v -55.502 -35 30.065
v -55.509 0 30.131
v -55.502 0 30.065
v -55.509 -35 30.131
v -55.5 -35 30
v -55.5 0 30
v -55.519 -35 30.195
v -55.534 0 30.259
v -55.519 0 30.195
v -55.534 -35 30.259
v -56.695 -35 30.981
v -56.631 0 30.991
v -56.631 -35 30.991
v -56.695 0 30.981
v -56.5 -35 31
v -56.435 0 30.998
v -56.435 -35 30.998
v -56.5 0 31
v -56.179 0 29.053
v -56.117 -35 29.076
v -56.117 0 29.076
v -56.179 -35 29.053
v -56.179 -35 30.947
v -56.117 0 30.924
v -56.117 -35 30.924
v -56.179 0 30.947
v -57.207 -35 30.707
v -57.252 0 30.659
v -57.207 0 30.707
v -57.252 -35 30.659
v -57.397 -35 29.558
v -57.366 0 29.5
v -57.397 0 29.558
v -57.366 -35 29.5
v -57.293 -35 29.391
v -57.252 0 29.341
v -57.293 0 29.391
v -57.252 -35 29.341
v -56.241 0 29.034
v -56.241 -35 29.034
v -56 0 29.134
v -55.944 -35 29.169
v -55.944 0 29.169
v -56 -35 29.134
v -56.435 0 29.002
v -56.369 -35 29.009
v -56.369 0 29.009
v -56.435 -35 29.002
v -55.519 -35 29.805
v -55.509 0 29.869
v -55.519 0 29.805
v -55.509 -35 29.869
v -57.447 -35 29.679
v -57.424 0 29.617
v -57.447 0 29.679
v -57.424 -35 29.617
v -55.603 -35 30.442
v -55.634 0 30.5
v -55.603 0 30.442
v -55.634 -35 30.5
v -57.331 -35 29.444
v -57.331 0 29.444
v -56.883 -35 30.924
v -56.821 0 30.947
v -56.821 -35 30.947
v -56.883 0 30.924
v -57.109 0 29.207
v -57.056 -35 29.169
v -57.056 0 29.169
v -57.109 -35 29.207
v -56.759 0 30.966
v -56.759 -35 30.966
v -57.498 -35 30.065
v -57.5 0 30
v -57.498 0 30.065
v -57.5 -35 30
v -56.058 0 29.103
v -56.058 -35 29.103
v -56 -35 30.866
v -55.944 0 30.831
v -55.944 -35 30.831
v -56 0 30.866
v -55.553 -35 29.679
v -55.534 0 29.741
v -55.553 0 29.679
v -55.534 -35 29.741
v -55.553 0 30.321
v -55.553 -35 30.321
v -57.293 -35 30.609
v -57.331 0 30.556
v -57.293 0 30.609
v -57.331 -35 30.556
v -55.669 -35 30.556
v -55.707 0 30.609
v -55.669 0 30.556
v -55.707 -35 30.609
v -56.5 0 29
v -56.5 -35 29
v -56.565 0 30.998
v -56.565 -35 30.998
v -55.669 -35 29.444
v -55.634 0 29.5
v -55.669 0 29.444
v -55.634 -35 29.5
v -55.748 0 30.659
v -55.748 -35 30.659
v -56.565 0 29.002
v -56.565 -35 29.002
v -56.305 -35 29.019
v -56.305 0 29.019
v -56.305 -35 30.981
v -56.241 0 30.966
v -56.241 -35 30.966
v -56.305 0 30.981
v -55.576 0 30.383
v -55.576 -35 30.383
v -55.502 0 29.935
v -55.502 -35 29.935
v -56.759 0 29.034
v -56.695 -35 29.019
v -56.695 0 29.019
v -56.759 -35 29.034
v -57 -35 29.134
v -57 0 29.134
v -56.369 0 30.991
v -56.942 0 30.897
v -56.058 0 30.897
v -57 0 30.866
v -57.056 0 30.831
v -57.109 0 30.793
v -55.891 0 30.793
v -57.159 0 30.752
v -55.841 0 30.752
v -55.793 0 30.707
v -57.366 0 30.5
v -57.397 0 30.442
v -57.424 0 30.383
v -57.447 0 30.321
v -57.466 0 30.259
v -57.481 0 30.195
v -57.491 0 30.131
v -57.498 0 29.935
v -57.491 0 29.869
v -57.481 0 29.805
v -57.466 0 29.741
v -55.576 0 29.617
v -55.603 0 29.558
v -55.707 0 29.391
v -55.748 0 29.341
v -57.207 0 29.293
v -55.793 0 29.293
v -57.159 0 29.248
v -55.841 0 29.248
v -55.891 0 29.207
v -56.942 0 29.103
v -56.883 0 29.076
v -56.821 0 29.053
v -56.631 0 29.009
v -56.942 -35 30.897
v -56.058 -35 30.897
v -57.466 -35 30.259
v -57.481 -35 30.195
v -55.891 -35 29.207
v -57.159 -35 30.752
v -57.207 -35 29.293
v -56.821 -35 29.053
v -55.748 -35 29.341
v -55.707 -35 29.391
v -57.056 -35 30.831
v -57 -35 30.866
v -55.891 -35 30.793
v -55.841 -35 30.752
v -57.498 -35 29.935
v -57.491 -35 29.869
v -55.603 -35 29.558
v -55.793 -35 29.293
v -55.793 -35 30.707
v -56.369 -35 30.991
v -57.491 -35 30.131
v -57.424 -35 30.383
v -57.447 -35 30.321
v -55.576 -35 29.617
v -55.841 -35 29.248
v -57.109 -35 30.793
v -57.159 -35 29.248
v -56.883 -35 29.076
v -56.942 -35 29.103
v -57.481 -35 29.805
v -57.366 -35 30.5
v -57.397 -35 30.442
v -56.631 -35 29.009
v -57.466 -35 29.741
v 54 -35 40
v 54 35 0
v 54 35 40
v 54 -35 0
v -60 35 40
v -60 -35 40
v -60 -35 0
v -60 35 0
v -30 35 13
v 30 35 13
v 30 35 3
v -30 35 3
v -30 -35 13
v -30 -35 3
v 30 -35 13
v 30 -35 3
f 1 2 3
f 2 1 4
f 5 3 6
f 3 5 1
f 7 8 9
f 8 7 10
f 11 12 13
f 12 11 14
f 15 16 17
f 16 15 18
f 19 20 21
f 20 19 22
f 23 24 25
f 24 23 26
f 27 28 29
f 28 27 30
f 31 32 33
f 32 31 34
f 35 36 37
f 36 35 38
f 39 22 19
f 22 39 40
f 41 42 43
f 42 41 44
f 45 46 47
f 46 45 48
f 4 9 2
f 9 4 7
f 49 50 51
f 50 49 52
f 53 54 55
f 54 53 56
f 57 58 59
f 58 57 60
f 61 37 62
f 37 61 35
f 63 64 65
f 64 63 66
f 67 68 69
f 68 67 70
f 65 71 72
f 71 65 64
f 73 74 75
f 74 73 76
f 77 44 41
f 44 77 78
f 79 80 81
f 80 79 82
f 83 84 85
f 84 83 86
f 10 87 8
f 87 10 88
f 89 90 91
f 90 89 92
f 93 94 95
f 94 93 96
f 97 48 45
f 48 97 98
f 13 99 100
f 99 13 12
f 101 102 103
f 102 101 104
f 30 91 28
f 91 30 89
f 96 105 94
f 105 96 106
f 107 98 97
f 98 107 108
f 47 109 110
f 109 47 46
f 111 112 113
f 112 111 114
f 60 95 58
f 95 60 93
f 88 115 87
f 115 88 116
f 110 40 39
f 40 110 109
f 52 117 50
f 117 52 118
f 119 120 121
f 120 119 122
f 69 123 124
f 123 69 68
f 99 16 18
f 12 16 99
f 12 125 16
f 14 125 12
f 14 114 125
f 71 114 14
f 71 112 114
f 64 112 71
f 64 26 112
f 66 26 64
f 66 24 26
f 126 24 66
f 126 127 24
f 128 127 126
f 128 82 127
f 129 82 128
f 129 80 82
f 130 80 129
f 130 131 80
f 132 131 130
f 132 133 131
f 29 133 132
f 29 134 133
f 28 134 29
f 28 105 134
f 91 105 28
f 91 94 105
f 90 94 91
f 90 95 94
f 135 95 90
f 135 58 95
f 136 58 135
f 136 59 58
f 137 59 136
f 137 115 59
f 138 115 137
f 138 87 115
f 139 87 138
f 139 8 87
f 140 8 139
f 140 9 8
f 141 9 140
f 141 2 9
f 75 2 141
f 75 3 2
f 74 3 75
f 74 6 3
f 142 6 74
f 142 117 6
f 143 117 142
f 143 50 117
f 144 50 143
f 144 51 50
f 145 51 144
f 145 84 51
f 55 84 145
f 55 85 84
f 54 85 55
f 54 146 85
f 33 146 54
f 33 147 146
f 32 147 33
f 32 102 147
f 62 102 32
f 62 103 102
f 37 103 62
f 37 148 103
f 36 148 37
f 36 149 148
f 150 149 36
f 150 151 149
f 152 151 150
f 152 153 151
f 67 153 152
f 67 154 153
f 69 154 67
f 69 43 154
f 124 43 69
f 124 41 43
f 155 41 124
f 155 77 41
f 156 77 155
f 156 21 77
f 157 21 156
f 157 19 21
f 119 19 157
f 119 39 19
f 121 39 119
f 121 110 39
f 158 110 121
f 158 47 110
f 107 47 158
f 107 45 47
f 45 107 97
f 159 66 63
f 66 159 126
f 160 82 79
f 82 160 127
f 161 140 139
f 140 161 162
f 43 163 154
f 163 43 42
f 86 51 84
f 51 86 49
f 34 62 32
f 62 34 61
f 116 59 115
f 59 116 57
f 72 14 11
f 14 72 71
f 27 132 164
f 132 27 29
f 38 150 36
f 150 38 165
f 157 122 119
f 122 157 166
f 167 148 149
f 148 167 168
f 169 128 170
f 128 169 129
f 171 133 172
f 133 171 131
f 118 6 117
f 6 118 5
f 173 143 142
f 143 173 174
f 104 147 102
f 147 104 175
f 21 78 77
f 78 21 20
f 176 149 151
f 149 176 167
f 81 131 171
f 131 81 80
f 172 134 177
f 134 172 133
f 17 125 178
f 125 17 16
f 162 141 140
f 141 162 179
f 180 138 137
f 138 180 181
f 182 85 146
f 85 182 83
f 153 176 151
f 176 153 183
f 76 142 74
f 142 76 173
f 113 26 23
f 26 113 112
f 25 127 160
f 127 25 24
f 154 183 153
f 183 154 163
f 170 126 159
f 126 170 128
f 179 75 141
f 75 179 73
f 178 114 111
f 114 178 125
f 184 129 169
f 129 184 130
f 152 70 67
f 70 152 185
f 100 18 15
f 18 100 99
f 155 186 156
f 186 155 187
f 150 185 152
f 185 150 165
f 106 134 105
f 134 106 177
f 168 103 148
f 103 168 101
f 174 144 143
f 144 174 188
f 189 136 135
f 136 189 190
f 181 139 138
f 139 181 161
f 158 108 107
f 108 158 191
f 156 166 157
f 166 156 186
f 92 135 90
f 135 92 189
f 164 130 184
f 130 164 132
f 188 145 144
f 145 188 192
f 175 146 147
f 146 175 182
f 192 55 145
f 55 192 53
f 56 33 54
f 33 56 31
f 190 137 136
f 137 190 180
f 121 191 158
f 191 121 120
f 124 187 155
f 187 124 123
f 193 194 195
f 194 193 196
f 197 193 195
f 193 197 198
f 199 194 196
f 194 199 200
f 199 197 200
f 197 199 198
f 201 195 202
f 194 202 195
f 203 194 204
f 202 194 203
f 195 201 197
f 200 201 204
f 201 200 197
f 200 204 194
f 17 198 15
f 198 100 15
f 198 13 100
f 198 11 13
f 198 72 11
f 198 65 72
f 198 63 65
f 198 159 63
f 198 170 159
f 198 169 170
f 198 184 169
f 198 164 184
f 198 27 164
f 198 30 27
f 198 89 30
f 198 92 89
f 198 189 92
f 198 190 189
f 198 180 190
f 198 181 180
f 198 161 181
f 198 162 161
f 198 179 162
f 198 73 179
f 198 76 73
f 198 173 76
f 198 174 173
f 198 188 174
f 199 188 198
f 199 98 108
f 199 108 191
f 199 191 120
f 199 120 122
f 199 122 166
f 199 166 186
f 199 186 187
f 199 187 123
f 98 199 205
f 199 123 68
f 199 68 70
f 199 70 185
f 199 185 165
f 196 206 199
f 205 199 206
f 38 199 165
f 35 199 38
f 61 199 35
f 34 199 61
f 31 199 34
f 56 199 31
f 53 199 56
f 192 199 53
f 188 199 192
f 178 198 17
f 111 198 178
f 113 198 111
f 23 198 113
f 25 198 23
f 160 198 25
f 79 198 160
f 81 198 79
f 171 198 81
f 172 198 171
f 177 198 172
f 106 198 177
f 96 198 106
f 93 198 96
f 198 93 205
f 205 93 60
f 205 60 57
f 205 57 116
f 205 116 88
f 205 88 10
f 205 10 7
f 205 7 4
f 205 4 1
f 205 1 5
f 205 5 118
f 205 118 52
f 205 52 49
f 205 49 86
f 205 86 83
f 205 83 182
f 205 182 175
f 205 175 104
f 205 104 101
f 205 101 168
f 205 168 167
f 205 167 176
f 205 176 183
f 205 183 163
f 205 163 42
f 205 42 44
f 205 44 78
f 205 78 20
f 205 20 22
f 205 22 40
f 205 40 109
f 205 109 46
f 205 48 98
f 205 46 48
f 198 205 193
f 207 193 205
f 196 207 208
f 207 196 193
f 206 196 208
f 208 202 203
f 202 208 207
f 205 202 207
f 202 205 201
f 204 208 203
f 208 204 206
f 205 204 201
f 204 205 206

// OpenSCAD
// Mini horizontal gel-electrophoresis box - buffer tank
// Print orientation: base on XY plane, open top facing +Z

// ---- Tank dimensions ----
outer_x = 120;   // outer length along X
outer_y = 70;    // outer width along Y (inner width)
tank_h  = 40;    // overall height along Z
wall    = 3;     // wall thickness
floor   = 3;     // floor thickness

// ---- Platform ----
plat_len   = 60; // platform length along X
plat_top_z = 13; // top of platform (10 mm above inner floor)

// ---- Holes ----
hole_d     = 2;  // electrode wire hole diameter
hole_y     = 0;  // hole Y position
hole_z     = 30; // hole Z position

// ---- Modelling ----
eps = 0.5;       // cutter overshoot
$fn = 96;

inner_x = outer_x - 2*wall;

difference() {
    // Tank body
    translate([-outer_x/2, -outer_y/2, 0])
        cube([inner_x, outer_y, tank_h]);

    // Raised platform
    translate([-plat_len/2, -outer_y/2, floor])
        cube([plat_len, outer_y, plat_top_z - floor]);

    // Electrode holes
    for (sx = [-1, 1])
        translate([sx * (inner_x/2 - eps), hole_y, hole_z])
            rotate([90, 0, 0])
                cylinder(d = hole_d, h = outer_y + 2*eps);
}
